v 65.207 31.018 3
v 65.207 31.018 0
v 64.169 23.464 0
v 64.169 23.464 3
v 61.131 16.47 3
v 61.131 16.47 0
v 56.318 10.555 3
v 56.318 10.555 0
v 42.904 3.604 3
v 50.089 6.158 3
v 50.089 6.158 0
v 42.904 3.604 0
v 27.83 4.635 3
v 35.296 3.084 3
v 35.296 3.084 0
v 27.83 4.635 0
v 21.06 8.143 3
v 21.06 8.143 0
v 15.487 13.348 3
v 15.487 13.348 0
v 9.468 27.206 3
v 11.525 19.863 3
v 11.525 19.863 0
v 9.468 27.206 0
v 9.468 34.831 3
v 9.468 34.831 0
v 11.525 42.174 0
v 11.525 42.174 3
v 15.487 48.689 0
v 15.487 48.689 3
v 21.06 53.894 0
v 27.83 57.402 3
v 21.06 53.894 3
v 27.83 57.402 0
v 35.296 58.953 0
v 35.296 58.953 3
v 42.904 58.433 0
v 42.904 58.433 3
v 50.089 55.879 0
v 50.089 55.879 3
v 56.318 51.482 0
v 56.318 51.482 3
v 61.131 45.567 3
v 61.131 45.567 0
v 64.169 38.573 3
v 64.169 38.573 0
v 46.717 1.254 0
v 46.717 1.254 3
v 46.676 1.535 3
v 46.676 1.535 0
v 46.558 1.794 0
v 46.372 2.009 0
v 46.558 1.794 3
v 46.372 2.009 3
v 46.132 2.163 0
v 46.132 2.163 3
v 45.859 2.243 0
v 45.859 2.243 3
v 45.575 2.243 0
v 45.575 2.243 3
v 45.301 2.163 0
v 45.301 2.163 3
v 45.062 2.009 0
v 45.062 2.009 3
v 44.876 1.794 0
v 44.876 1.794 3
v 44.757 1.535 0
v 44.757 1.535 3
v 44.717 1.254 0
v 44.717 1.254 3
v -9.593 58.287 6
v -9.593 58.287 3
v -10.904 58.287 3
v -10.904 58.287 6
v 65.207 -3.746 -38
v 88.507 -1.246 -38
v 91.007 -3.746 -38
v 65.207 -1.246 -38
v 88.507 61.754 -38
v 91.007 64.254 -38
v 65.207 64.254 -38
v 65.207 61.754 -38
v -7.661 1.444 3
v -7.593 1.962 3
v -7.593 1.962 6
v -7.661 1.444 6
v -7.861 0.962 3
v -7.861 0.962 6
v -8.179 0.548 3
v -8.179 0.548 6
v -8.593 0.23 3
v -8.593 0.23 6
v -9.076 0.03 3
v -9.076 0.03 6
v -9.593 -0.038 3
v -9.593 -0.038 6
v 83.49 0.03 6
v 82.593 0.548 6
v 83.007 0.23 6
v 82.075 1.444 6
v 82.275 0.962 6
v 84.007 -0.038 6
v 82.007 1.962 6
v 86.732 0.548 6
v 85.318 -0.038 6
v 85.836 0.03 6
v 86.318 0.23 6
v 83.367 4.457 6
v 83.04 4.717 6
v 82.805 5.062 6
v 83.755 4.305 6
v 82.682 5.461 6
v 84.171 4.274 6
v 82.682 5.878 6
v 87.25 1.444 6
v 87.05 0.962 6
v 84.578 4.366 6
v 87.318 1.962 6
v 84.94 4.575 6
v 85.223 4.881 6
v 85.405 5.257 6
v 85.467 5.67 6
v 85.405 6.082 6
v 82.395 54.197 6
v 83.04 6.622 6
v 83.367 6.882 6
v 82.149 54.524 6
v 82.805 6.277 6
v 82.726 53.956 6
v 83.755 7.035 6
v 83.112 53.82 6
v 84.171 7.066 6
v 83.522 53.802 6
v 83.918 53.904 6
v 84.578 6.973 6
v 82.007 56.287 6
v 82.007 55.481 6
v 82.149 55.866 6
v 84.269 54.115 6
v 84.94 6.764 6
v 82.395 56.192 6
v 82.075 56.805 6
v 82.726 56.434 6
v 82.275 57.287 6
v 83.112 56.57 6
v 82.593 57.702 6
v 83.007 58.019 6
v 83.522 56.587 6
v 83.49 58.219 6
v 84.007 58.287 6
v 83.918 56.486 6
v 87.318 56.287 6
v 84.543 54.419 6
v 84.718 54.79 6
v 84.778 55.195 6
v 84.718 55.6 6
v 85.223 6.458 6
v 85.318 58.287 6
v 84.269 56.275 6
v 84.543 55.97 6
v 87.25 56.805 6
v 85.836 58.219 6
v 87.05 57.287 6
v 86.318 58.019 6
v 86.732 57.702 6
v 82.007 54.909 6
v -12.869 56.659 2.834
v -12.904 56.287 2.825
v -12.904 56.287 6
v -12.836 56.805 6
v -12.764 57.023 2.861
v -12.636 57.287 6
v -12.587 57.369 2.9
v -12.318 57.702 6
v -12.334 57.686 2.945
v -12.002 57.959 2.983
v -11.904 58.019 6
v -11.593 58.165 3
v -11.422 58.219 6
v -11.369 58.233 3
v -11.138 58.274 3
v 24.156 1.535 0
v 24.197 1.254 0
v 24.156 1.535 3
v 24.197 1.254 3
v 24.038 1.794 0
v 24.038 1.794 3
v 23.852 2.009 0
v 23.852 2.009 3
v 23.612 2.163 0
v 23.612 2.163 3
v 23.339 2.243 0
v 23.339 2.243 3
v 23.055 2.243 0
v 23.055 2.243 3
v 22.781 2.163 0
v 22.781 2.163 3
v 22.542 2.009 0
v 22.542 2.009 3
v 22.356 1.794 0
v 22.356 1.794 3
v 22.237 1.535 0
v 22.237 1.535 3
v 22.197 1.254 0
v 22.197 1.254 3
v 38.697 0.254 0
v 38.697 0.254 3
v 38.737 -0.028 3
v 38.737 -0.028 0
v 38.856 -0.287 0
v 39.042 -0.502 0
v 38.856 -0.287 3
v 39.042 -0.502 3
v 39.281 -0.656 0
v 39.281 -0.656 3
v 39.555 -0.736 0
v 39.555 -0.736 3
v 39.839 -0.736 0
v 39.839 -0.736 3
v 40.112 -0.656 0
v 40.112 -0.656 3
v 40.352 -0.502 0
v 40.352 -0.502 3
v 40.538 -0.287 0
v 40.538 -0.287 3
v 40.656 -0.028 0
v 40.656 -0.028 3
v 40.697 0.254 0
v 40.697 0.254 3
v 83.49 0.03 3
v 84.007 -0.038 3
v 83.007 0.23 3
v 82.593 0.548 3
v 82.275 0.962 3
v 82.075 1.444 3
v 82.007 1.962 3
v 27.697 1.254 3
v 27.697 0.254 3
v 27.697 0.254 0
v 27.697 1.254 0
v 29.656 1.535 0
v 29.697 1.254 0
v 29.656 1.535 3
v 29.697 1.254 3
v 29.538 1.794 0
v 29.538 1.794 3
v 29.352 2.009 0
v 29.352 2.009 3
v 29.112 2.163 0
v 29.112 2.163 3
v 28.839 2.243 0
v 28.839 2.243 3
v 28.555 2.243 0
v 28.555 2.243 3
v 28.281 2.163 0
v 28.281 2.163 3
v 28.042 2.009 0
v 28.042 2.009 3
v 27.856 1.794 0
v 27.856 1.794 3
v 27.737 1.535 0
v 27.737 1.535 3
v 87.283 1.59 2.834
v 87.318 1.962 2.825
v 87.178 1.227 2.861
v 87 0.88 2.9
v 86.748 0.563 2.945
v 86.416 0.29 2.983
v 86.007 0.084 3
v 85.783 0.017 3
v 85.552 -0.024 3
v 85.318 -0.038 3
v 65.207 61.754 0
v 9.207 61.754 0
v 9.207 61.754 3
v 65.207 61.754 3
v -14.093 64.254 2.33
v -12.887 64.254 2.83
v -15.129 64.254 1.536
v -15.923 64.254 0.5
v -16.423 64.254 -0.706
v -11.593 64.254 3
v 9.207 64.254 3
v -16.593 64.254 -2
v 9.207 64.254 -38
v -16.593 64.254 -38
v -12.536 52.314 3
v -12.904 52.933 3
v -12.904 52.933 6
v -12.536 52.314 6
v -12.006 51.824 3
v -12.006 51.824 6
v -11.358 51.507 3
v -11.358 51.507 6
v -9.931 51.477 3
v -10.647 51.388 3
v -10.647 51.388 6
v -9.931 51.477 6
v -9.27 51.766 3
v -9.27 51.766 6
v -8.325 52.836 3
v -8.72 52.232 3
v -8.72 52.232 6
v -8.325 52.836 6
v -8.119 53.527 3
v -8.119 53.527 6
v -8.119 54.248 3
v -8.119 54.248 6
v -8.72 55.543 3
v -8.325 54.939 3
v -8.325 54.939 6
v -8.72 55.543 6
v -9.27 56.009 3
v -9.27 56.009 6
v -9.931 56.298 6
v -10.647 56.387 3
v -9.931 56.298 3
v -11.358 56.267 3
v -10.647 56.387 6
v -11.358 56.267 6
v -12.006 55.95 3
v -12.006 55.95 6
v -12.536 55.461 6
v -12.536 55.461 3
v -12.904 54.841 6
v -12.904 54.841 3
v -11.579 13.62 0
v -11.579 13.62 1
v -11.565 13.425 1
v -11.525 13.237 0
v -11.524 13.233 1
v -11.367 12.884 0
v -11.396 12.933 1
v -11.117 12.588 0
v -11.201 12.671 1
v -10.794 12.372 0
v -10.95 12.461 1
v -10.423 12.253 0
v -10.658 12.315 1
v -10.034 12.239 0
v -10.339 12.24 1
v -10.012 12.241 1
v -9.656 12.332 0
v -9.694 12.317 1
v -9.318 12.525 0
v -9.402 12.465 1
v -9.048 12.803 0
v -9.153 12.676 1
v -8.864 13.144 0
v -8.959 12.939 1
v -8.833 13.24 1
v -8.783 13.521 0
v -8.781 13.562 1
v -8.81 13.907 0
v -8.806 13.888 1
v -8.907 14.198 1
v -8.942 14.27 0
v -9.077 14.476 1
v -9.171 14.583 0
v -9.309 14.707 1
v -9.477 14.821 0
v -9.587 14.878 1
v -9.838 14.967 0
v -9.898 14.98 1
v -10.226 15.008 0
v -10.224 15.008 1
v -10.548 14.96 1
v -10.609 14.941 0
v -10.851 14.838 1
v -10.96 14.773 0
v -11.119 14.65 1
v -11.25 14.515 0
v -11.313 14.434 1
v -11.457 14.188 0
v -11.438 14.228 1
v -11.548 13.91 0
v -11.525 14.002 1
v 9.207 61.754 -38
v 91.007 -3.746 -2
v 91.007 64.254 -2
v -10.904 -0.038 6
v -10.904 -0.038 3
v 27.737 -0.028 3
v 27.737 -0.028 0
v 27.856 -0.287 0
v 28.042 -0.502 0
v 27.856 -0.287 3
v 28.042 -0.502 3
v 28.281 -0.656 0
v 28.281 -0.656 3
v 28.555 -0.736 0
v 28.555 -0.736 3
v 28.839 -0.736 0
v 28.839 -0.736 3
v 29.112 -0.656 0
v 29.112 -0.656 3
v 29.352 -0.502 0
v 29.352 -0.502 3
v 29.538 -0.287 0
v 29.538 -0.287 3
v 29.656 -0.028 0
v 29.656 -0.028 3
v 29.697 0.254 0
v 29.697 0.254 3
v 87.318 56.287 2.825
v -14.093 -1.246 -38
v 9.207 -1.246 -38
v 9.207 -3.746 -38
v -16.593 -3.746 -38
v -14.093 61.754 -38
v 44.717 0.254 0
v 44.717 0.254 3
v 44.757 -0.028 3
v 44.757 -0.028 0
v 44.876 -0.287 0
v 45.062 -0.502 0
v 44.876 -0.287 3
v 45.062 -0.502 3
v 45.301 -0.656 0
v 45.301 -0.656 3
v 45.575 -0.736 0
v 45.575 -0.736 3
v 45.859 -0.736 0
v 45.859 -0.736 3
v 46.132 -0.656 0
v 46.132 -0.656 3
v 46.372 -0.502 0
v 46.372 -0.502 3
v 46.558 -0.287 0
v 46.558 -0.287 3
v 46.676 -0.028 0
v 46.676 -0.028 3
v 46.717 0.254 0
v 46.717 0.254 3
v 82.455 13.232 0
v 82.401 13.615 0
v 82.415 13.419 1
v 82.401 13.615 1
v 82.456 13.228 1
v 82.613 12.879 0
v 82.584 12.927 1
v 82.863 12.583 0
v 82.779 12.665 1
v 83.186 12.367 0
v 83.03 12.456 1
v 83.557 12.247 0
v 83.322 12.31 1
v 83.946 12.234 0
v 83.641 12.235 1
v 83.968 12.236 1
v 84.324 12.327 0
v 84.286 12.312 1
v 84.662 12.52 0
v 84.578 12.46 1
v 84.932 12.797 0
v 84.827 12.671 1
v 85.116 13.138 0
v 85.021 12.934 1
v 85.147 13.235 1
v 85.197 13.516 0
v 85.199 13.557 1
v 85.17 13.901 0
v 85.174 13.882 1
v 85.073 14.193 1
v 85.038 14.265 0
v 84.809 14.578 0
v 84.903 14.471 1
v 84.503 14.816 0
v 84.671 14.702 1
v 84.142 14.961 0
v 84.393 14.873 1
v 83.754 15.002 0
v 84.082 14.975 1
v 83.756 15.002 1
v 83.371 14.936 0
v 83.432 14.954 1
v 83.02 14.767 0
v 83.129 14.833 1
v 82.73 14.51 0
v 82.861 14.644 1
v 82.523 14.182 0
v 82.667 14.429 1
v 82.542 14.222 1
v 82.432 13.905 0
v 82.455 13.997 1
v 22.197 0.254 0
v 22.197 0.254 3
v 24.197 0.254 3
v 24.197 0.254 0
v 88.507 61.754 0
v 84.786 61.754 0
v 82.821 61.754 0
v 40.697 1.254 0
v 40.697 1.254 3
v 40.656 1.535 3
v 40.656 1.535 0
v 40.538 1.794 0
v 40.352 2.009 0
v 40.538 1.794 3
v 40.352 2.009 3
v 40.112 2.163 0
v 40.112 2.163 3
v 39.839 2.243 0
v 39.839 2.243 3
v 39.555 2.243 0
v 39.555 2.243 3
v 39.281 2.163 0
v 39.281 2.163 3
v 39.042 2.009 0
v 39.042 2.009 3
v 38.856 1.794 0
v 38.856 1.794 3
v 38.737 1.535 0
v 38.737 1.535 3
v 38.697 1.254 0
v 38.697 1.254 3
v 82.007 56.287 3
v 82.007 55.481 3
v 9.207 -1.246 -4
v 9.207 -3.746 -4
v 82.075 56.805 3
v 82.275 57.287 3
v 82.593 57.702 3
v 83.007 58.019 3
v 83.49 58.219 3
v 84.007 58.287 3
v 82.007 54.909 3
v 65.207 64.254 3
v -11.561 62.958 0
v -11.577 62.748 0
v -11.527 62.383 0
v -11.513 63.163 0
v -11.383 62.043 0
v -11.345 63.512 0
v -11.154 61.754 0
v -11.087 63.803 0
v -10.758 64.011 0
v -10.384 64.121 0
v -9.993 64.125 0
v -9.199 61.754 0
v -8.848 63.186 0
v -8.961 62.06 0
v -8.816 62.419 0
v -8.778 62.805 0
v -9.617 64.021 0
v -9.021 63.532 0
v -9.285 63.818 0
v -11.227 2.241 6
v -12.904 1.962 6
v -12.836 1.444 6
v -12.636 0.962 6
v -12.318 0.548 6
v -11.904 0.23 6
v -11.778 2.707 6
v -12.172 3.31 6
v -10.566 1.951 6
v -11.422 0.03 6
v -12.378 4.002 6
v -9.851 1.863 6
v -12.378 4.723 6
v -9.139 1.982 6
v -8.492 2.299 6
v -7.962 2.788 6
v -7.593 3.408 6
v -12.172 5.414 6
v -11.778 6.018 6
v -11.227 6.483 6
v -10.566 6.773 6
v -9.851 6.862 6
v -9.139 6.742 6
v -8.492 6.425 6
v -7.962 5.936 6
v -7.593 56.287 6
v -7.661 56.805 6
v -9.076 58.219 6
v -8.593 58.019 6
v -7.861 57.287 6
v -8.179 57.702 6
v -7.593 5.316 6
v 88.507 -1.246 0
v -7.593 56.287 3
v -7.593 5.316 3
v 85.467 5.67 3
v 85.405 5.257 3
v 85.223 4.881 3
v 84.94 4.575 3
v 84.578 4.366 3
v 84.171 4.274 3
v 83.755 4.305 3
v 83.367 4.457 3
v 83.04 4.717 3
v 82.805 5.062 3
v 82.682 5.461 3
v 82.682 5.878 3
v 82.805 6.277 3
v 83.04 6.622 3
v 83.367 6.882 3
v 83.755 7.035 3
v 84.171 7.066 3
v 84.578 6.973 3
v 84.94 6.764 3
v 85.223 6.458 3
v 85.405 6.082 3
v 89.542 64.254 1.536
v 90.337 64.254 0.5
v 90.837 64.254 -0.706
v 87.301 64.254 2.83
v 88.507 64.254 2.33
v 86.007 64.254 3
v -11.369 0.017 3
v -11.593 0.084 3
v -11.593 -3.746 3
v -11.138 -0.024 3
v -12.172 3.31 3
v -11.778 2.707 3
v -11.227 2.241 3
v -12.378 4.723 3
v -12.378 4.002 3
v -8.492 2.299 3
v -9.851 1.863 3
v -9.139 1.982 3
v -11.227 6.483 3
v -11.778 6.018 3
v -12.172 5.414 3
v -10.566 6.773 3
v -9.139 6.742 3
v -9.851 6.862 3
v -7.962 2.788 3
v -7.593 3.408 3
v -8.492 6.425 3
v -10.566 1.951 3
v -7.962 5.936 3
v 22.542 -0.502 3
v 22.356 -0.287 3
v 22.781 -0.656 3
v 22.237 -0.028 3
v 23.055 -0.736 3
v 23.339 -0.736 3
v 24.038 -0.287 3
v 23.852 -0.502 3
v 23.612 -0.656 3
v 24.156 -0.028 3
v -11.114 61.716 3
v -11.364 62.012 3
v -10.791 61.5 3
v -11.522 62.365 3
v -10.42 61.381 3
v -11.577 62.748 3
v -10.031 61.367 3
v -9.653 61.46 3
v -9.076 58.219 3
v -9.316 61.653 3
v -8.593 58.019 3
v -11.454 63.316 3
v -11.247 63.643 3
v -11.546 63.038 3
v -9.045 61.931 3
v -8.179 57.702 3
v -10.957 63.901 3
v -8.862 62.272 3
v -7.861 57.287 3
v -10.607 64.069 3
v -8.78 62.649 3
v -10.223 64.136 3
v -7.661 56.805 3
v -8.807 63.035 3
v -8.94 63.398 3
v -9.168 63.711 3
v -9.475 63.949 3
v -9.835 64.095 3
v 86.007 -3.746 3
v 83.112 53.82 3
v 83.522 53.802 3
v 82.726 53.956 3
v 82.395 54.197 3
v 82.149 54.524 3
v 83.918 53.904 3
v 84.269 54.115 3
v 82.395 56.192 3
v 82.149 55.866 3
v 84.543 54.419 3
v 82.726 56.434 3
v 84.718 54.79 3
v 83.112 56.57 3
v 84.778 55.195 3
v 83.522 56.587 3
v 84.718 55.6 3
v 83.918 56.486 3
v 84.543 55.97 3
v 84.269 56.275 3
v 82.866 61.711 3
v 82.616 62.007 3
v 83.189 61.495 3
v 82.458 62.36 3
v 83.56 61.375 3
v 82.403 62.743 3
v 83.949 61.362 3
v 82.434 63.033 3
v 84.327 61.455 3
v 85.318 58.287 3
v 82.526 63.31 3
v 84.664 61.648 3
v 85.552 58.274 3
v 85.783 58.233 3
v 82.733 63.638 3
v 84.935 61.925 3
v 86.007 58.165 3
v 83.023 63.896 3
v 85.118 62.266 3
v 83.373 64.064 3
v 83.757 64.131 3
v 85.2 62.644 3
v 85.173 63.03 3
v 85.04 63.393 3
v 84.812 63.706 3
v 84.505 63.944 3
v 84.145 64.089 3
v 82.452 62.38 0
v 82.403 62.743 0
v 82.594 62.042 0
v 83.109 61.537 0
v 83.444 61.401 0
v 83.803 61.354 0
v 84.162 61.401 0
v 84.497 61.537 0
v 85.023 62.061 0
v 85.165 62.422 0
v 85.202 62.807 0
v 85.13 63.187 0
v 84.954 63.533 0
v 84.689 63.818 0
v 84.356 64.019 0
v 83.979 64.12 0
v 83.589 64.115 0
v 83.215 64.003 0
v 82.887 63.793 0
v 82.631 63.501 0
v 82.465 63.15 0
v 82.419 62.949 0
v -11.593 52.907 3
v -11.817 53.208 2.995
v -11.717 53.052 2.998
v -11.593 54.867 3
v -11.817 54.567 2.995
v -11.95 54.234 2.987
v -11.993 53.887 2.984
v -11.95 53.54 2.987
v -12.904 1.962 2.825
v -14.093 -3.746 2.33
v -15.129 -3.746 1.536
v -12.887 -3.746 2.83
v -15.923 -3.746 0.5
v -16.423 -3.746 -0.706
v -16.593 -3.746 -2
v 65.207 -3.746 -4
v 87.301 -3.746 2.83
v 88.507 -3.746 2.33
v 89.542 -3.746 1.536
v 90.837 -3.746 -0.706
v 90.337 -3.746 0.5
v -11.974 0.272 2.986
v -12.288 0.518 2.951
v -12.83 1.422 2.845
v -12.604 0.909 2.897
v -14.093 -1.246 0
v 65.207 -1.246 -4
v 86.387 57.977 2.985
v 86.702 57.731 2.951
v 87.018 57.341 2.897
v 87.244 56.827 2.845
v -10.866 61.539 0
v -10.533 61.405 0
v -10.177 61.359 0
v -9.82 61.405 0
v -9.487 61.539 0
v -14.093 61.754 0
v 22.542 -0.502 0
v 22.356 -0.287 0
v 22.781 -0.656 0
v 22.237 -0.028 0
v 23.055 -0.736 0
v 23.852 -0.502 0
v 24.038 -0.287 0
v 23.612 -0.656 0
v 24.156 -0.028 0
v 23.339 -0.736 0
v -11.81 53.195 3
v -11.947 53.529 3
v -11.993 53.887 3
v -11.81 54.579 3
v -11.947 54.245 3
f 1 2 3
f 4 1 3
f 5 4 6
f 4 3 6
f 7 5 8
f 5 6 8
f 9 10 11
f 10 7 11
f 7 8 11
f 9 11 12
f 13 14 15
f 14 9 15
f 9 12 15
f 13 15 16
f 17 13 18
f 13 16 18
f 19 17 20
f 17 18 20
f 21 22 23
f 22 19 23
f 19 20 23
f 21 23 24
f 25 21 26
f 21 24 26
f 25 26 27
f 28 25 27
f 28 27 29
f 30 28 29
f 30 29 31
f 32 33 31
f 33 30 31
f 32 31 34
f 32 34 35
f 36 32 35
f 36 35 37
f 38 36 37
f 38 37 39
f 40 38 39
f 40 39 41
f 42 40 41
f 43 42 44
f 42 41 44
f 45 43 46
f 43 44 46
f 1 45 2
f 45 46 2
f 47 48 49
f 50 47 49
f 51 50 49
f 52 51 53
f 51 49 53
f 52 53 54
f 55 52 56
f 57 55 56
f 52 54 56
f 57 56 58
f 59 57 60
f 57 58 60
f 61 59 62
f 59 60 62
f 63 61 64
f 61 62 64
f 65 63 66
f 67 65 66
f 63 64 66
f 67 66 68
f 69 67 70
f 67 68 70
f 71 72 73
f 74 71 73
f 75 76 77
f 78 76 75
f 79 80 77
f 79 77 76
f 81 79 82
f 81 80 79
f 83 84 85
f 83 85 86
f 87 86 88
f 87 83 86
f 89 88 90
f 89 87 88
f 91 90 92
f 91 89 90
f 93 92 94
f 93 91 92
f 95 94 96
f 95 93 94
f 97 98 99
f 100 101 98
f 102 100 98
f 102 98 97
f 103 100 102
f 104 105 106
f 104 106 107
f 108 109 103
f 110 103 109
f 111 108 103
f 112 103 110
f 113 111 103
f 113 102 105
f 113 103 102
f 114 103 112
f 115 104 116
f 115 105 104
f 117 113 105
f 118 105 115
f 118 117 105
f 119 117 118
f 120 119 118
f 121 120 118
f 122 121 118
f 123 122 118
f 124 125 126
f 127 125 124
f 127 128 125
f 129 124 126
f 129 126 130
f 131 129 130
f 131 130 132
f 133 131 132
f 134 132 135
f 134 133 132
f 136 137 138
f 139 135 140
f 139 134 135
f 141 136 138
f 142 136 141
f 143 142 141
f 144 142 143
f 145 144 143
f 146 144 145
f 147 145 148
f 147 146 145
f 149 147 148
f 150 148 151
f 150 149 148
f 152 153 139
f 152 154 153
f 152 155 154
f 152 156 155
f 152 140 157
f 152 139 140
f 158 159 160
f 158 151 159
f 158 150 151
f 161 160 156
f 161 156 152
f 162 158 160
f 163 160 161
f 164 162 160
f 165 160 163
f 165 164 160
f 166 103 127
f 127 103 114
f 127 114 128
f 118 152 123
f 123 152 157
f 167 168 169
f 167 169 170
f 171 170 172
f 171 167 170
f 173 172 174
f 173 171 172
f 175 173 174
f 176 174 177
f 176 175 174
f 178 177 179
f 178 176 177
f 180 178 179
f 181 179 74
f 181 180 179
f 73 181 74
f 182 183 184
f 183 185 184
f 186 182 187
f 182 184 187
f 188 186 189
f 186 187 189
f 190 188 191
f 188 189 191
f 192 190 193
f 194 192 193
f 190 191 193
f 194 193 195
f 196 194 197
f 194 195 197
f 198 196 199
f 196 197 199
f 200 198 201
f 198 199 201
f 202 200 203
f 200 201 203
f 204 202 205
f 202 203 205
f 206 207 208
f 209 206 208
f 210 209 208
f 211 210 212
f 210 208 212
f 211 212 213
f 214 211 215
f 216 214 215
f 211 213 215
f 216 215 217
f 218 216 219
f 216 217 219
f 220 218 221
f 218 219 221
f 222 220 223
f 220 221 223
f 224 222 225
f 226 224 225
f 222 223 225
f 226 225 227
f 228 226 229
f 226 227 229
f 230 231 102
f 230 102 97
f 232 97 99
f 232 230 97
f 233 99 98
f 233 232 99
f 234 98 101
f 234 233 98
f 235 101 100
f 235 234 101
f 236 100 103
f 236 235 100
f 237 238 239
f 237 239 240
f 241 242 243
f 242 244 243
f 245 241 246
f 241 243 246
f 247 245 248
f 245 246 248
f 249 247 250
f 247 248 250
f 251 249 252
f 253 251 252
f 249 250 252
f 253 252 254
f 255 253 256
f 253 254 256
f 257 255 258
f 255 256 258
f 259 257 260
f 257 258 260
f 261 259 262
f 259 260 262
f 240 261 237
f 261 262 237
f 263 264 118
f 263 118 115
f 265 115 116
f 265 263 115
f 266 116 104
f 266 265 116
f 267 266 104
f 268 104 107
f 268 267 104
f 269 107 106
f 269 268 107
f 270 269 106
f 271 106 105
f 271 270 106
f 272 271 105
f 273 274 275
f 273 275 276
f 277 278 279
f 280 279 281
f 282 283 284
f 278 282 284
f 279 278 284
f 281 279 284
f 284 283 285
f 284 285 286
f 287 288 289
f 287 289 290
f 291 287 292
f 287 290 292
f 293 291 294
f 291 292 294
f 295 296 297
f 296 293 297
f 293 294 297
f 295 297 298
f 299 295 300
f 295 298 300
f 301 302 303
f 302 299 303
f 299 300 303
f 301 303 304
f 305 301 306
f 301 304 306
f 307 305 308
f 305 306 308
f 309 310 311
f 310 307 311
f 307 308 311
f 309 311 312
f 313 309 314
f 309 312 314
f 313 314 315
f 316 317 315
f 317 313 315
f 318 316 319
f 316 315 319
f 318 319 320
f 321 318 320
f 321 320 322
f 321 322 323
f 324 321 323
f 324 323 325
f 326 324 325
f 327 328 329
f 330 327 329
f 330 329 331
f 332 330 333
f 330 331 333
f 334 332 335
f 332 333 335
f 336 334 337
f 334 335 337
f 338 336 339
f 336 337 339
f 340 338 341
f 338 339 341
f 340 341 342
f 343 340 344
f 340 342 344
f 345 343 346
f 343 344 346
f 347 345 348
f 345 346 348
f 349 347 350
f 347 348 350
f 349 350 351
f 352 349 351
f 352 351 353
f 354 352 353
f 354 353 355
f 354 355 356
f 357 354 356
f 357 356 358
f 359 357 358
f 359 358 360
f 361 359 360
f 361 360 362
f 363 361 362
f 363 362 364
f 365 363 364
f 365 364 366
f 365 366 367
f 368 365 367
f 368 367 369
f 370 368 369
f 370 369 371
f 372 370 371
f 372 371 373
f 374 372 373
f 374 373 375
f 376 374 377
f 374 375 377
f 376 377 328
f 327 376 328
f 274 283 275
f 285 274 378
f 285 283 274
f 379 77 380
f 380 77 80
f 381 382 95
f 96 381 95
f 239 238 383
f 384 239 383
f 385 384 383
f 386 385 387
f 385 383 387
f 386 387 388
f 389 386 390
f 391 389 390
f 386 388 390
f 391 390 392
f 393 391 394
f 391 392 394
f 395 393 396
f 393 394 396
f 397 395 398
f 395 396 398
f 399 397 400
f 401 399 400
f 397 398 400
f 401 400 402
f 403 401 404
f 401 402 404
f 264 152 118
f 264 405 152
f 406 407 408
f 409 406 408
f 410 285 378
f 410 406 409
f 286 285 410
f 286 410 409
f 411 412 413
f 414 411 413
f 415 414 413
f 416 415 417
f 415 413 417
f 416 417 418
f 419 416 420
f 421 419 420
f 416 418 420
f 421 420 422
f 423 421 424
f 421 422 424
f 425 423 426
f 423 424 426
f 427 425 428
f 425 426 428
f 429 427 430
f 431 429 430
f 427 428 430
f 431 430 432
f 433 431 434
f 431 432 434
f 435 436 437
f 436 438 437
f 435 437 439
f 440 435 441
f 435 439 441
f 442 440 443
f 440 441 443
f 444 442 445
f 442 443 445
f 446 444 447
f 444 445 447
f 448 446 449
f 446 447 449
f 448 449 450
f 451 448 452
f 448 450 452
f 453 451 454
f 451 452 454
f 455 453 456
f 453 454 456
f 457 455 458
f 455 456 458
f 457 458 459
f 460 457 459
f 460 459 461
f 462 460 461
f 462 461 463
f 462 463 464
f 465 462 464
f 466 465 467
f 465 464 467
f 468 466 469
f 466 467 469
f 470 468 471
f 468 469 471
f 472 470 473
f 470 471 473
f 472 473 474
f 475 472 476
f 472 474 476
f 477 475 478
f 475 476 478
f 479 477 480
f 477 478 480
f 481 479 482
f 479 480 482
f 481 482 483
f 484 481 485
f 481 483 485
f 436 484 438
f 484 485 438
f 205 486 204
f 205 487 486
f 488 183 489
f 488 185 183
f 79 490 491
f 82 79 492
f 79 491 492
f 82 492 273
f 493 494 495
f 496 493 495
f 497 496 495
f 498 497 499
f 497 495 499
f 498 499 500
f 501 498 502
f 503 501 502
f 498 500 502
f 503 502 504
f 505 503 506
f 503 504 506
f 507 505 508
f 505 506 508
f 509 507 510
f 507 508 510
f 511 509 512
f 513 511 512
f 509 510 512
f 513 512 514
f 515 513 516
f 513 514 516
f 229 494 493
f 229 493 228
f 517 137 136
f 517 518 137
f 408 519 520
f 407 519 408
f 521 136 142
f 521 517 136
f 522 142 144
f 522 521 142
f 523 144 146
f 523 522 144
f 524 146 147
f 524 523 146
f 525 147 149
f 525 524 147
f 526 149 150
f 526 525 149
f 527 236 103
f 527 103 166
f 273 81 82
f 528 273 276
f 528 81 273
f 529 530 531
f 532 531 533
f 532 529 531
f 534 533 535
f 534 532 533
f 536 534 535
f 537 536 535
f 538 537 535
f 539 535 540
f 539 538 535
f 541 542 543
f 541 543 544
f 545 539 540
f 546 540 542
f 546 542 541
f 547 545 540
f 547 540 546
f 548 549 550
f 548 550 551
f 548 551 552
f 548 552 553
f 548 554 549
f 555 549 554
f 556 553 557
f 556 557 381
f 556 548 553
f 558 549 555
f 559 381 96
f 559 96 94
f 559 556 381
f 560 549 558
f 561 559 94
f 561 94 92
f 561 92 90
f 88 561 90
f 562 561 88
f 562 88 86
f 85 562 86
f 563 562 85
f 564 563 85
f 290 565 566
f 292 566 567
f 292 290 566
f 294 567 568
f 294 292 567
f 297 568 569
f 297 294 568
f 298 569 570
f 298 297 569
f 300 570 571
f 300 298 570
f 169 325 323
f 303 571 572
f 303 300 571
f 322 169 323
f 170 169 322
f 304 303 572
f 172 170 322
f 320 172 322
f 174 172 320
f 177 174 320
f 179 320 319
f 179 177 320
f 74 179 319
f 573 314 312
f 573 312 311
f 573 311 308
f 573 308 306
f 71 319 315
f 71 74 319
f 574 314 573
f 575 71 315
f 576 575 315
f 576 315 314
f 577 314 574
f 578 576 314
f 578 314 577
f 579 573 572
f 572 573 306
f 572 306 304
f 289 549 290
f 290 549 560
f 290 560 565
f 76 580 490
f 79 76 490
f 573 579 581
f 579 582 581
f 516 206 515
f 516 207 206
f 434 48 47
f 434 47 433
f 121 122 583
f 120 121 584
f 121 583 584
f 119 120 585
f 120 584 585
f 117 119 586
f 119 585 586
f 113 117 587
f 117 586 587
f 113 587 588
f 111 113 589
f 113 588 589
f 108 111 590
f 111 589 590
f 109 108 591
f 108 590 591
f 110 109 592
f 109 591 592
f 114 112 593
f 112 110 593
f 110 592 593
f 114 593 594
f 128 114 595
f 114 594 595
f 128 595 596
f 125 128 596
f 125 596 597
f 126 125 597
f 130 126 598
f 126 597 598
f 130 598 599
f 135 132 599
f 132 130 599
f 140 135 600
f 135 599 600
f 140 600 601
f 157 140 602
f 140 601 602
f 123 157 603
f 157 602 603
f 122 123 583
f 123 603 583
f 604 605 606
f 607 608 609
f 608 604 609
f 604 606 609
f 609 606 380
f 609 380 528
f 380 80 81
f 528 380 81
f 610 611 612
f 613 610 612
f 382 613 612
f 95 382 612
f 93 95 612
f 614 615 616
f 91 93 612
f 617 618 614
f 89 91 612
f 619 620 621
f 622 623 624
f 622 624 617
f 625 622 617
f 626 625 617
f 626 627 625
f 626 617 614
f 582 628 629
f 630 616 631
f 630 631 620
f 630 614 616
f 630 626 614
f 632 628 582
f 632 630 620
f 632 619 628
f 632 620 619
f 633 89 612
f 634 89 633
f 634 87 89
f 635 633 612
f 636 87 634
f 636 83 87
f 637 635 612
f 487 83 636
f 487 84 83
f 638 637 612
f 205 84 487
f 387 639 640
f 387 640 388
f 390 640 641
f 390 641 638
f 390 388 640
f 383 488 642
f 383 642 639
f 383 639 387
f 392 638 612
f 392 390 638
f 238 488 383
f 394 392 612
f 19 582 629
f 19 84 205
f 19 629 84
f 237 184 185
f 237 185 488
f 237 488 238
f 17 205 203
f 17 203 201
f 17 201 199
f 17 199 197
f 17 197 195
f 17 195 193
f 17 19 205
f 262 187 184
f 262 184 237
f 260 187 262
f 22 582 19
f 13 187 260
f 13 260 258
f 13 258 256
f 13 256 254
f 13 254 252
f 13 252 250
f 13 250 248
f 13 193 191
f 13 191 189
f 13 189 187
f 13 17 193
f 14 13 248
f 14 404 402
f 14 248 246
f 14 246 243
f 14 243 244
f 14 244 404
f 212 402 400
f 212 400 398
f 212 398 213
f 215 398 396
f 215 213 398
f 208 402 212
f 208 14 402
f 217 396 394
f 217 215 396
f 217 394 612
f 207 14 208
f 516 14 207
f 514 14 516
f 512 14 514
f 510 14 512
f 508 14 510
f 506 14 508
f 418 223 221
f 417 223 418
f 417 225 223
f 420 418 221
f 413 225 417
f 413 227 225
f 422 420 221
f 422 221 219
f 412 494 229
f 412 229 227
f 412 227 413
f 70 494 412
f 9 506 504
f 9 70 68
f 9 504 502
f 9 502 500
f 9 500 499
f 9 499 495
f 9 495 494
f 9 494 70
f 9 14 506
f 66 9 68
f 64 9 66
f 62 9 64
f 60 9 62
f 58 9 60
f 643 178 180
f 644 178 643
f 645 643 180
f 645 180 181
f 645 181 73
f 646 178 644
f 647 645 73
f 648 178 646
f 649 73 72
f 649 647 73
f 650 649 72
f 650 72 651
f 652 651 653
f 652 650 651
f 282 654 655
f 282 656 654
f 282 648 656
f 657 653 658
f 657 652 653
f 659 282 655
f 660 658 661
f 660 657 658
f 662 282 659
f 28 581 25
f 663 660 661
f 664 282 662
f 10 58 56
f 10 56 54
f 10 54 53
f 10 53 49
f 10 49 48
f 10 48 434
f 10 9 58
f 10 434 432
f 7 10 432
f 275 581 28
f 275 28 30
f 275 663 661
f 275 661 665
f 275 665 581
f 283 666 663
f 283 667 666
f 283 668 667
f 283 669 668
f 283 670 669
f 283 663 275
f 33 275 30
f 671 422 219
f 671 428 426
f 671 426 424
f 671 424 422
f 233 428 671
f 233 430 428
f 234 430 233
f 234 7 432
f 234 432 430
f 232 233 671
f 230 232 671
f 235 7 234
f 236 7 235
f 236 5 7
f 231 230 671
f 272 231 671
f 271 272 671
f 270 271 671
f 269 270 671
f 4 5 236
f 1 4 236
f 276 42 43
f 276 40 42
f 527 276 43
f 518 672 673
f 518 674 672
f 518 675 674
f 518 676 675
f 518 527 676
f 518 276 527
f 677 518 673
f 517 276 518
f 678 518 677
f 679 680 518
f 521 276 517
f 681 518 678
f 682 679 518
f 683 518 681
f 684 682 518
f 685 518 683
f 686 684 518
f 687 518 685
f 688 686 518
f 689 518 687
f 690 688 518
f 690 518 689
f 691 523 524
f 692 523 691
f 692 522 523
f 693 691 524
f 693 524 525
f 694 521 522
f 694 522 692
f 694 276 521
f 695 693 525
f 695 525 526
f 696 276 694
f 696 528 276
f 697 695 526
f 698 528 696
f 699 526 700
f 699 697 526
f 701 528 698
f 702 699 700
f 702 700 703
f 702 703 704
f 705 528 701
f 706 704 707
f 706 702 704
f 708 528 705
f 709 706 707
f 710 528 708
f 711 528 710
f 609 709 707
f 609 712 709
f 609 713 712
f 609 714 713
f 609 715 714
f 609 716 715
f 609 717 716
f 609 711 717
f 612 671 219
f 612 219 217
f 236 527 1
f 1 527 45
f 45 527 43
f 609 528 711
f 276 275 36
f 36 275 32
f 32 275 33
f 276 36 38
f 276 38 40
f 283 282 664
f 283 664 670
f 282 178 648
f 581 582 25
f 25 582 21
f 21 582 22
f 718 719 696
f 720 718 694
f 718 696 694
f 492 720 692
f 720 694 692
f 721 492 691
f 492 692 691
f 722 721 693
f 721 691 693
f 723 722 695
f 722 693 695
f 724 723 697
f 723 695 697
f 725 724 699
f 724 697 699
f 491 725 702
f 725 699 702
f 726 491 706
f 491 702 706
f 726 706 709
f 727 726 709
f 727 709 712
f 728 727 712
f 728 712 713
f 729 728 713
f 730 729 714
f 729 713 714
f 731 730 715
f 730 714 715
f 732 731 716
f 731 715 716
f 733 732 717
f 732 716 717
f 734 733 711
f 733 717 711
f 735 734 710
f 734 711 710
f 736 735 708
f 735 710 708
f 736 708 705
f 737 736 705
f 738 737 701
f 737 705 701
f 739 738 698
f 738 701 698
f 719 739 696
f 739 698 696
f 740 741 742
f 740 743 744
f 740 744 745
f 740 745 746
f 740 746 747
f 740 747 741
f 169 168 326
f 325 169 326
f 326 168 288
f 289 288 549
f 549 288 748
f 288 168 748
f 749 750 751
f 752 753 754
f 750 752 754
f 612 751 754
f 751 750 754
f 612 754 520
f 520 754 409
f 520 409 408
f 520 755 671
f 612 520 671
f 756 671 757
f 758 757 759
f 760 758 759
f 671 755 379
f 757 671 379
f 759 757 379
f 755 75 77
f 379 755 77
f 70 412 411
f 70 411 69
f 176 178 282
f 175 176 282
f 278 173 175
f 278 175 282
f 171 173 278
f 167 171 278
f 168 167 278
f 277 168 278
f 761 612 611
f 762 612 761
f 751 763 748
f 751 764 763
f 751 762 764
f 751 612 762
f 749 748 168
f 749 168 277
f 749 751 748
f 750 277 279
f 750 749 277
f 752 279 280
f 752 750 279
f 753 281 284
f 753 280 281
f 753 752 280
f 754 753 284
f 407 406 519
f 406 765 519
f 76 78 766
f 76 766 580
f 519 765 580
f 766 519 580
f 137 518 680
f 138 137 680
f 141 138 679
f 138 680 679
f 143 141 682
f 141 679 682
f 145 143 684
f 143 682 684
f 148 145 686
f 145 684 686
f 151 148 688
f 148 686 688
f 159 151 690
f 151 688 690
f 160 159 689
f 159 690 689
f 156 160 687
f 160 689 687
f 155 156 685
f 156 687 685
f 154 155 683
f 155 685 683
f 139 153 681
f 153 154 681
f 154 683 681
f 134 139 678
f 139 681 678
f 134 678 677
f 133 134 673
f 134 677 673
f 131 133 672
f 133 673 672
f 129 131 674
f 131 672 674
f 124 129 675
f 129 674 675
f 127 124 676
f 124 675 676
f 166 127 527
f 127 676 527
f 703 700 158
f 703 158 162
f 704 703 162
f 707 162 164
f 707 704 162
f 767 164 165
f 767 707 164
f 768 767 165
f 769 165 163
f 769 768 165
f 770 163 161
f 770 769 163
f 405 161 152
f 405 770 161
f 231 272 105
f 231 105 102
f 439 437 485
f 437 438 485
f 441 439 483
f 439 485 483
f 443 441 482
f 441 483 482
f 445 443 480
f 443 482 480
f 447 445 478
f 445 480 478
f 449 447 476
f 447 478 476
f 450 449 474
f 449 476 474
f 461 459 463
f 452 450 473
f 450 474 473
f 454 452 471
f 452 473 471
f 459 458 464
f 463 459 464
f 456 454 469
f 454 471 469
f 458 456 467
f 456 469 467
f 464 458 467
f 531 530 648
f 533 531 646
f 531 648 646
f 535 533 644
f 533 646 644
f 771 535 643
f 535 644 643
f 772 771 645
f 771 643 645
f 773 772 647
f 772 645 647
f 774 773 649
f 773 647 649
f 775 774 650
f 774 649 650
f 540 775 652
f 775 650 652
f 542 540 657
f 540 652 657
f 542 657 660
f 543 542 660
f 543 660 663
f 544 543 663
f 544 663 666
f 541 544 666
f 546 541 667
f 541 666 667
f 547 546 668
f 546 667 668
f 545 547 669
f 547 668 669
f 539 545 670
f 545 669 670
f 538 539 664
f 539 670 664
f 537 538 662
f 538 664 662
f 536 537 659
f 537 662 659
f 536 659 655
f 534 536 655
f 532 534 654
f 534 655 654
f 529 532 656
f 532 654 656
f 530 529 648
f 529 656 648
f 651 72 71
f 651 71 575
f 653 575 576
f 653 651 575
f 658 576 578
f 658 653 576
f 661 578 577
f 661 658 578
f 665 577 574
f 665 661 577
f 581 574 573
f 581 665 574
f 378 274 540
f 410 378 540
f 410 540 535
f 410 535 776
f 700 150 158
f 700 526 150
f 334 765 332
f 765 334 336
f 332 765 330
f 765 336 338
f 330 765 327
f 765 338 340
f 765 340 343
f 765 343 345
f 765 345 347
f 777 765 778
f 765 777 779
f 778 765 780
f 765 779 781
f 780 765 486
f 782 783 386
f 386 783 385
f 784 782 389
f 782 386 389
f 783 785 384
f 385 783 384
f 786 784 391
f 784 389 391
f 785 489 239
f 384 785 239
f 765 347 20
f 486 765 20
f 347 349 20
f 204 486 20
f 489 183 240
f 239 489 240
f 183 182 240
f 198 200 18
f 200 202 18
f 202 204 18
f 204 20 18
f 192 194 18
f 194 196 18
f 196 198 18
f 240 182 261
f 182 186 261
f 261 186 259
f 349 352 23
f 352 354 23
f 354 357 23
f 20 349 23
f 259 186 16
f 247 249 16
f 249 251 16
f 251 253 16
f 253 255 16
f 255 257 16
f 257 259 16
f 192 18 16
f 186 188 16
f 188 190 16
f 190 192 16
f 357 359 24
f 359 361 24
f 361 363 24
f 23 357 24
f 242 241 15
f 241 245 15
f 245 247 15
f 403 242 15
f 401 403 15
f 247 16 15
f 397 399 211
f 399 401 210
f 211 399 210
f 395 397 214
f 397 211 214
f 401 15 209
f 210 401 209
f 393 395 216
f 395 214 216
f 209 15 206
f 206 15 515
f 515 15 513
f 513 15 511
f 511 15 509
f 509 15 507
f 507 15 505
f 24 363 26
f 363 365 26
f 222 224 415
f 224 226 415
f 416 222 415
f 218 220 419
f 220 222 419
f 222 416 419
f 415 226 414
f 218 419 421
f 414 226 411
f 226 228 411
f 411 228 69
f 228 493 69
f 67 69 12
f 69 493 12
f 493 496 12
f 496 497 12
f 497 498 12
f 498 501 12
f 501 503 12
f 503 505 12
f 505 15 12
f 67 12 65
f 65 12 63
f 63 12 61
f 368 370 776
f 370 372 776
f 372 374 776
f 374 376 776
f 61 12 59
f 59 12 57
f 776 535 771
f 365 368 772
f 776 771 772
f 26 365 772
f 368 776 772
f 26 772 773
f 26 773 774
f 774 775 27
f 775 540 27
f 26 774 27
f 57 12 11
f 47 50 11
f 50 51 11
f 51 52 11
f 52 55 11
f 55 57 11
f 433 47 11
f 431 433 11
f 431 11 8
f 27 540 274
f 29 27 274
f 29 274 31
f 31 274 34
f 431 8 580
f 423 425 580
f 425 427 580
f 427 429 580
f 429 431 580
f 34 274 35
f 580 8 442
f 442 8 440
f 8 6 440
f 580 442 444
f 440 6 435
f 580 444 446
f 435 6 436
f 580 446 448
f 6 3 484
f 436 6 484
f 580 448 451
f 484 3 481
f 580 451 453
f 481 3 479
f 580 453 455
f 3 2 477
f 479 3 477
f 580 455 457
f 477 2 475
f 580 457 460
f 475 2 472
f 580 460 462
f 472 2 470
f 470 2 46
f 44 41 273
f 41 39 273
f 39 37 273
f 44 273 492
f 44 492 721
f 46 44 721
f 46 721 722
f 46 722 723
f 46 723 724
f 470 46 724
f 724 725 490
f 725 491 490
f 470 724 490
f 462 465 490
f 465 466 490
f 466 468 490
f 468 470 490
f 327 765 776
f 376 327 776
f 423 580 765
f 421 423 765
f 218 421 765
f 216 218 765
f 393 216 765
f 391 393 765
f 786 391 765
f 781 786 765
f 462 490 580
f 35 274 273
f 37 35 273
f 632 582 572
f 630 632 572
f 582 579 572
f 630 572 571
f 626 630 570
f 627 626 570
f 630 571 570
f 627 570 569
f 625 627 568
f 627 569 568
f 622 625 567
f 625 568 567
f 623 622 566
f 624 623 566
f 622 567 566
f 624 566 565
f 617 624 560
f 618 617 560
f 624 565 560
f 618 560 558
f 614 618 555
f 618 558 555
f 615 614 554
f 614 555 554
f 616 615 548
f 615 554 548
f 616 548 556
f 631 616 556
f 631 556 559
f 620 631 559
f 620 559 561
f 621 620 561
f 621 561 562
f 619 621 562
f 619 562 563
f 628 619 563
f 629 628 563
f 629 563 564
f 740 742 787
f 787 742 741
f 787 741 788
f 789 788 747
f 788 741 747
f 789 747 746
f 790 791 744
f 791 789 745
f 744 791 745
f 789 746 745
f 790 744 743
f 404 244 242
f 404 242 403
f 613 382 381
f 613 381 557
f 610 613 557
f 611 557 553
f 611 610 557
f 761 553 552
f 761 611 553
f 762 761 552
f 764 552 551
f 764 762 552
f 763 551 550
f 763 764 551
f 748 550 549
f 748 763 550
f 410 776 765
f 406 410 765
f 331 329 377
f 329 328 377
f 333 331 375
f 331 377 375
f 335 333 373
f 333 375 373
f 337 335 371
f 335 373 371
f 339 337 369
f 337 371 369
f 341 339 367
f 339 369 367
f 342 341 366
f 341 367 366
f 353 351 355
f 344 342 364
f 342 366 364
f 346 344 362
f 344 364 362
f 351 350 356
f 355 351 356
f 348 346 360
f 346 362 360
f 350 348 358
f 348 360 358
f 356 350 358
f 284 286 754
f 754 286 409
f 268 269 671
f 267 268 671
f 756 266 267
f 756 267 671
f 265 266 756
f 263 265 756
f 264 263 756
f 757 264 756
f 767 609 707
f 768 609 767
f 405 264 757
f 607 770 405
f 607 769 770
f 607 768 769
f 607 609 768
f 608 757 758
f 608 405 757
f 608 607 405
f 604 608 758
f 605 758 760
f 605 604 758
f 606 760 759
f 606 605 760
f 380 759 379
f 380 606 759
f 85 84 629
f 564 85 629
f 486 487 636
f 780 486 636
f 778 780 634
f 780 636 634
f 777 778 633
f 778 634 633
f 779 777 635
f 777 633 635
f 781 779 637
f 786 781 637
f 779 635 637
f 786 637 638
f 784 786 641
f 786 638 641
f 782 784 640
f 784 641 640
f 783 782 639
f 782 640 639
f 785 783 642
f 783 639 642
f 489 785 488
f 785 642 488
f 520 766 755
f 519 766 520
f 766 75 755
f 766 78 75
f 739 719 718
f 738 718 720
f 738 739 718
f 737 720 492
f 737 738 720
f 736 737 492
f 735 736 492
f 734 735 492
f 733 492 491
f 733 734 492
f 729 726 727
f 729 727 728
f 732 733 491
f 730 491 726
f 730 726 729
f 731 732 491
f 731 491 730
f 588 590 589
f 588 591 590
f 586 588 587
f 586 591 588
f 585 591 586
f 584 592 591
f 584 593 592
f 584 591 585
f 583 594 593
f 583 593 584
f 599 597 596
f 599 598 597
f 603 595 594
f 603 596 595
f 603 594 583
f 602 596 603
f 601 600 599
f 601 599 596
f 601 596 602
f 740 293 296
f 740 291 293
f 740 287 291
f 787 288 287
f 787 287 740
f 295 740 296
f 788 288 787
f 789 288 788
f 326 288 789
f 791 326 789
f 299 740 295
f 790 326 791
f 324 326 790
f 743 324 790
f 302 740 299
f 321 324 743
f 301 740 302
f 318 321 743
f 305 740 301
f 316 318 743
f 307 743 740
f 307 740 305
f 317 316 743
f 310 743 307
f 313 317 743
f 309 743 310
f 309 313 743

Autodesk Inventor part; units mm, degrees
ref_plane "YZ Plane" through (0, 0, 0) normal (1, 0, 0) x (0, 1, 0)
ref_plane "XZ Plane" through (0, 0, 0) normal (0, 1, 0) x (-1, 0, 0)
ref_plane "XY Plane" through (0, 0, 0) normal (0, 0, 1) x (1, 0, 0)
sketch "Sketch1" plane through (0, 0, 0) normal (0, 0, 1) x (1, 0, 0)
  circle A0 centre (37.2069, 31.0185) radius 28
  line L0 (-13.5931, 3.1035) -> (88.0069, 3.1035) construction
  line L1 (14.2069, 60.2535) -> (-13.5931, 60.2535) construction
  line L2 (88.0069, 60.2535) -> (60.0869, 60.2535) construction
  line L3 (88.0069, 3.1035) -> (88.0069, 60.2535) construction
  line L4 (-13.5931, 60.2535) -> (-13.5931, 3.1035) construction
  line L5 (11.269, 60.2207) -> (67.149, 60.2207) construction
  line L6 (67.149, 60.2207) -> (67.149, 72.2207) construction
  line L7 (67.149, 72.2207) -> (11.269, 72.2207) construction
  line L8 (11.269, 72.2207) -> (11.269, 60.2207) construction
  circle A1 centre (61.389, 6.2635) radius 1.5 construction
  circle A2 centre (61.389, 55.7935) radius 1.5 construction
  circle A3 centre (5.509, 55.7935) radius 1.5 construction
  circle A4 centre (11.269, 6.9135) radius 1.5 construction
  arc A5 (11.269, 7.6907) -> (11.269, 1.6907) centre (11.269, 4.6907) ccw construction
  line L9 (11.269, 1.6907) -> (11.269, -3.7465) construction
  line L10 (11.269, -3.7465) -> (67.149, -3.7465) construction
  line L11 (67.149, -3.7465) -> (67.149, 1.6907) construction
  arc A6 (67.149, 1.6907) -> (67.149, 7.6907) centre (67.149, 4.6907) ccw construction
  line L12 (67.149, 7.6907) -> (67.149, 51.2207) construction
  arc A7 (67.149, 51.2207) -> (67.149, 57.2207) centre (67.149, 54.2207) ccw construction
  line L13 (67.149, 57.2207) -> (67.149, 60.2207) construction
  line L14 (67.149, 60.2207) -> (11.269, 60.2207) construction
  line L15 (11.269, 60.2207) -> (11.269, 57.2207) construction
  arc A8 (11.269, 57.2207) -> (11.269, 51.2207) centre (11.269, 54.2207) ccw construction
  line L16 (11.269, 51.2207) -> (11.269, 7.6907) construction
  line L17 (-16.5931, -3.7465) -> (91.0069, -3.7465)
  line L18 (91.0069, -3.7465) -> (91.0069, 64.2535)
  line L19 (91.0069, 64.2535) -> (-16.5931, 64.2535)
  line L20 (-16.5931, 64.2535) -> (-16.5931, -3.7465)
  line L21 (37.2069, -3.7465) -> (37.2069, 64.2535) construction
  circle A9 centre (37.2069, 31.0185) radius 23 projected
  point P0 (0, 0)
  dimension "d42" = 0
  dimension "d43" = 3
  dimension "d44" = 3
  dimension "d45" = 4
  dimension "d46" = 4
  dimension "d47" = 57.15
  dimension "d48" = 57.15
  dimension "d49" = 101.6
  dimension "d50" = 3.81
  dimension "d56" = 68
  dimension "d59" = 56
extrude "Extrusion1" add sketch "Sketch1" along normal blind 3 contours L20 L19 L18 L17
sketch "Sketch2" plane through (0, 0, 0) normal (0, 0, -1) x (-1, 0, 0)
  circle A0 centre (-37.2069, 31.0185) radius 28 projected
  line L0 (16.5931, -3.7465) -> (-91.0069, -3.7465) projected
  line L1 (16.5931, 64.2535) -> (16.5931, -3.7465) projected
  line L2 (-91.0069, 64.2535) -> (16.5931, 64.2535) projected
  line L3 (-91.0069, -3.7465) -> (-91.0069, 64.2535) projected
  line L4 (-88.5069, 61.7535) -> (14.0931, 61.7535)
  line L5 (14.0931, 61.7535) -> (14.0931, -1.2465)
  line L6 (14.0931, -1.2465) -> (-88.5069, -1.2465)
  line L7 (-88.5069, -1.2465) -> (-88.5069, 61.7535)
  dimension "d51" = 2.5
  dimension "d52" = 2.5
  dimension "d53" = 2.5
  dimension "d54" = 2.5
extrude "Extrusion2" add sketch "Sketch2" along normal blind 38 contours L0 L3 L2 L1
sketch "Sketch4" plane through (0, 0, 3) normal (0, 0, 1) x (1, 0, 0)
  ellipse E0 centre (83.8034, 62.7427) end of major axis (82.4034, 62.7427) minor radius 1.3886 projected
  ellipse E1 centre (83.8006, 13.6146) end of major axis (82.4006, 13.6146) minor radius 1.3886 projected
  ellipse E2 centre (-10.1794, 13.6199) end of major axis (-11.5794, 13.6199) minor radius 1.3886 projected
  ellipse E3 centre (-10.1766, 62.7479) end of major axis (-11.5766, 62.7479) minor radius 1.3886 projected
  point P0 (0, 0)
extrude "Extrusion3" cut sketch "Sketch4" against normal blind 3
chamfer "Chamfer1" [suppressed]
sketch "Sketch5" plane through (-16.5931, 64.2535, 3) normal (0, 1, 0) x (1, 0, 0)
  line L0 (0, 0) -> (107.6, 0)
  line L1 (25.8, 63) -> (81.8, 63)
  line L2 (81.8, 63) -> (81.8, 7)
  line L3 (81.8, 7) -> (25.8, 7)
  line L4 (25.8, 7) -> (25.8, 63)
  line L5 (53.8, 0) -> (53.8, -31.7336) construction
  line L6 (25.8, 63) -> (81.8, 7) construction
  line L7 (81.8, 63) -> (25.8, 7) construction
  line L8 (104.9242, 0) -> (-0.6758, 0)
  line L9 (107.6, 0) -> (0, 0) projected
  line L10 (0, 41) -> (107.6, 41) projected
  line L11 (53.8, 41) -> (53.8, 0) construction
  point P0 (19.351, -30)
  point P1 (53.8, 35)
  point P2 (53.8, 35)
  dimension "d28" = 56
  dimension "d29" = 56
  dimension "d41" = 7
extrude "Extrusion4" cut sketch "Sketch5" against normal blind 100
fillet "Fillet2" radius 5 2 edges at (-16.5931, 30.2535, 3) (91.0069, 30.2535, 3)
fillet "Fillet3" [suppressed]
sketch "Sketch6" plane through (9.2069, 64.2535, -4) normal (0, 1, 0) x (1, 0, 0)
  line L0 (81.8, -7) -> (-25.8, -7) projected
  line L1 (0, 0) -> (56, 0)
  line L2 (56, 0) -> (56, -7)
  line L3 (56, -7) -> (0, -7)
  line L4 (0, -7) -> (0, 0)
  point P0 (76.8, -7)
  point P1 (-20.8, -7)
  point P2 (-9.2069, -4)
extrude "Extrusion5" cut sketch "Sketch6" against normal blind 2.5
sketch "Sketch7" plane through (0, 0, 3) normal (0, 0, 1) x (1, 0, 0)
  line L0 (-16.5931, -3.7465) -> (91.0069, -3.7465) projected
  line L1 (65.2069, 61.7535) -> (9.2069, 61.7535) projected
  line L2 (37.2069, -3.7465) -> (37.2069, 61.7535) construction
  line L3 (23.1969, -0.7465) -> (23.1969, -0.7465)
  line L4 (22.1969, 0.2535) -> (22.1969, 1.2535)
  line L5 (23.1969, 2.2535) -> (23.1969, 2.2535)
  line L6 (24.1969, 1.2535) -> (24.1969, 0.2535)
  arc A0 (24.1969, 1.2535) -> (23.1969, 2.2535) centre (23.1969, 1.2535) ccw
  arc A1 (23.1969, 2.2535) -> (22.1969, 1.2535) centre (23.1969, 1.2535) ccw
  arc A2 (22.1969, 0.2535) -> (23.1969, -0.7465) centre (23.1969, 0.2535) ccw
  arc A3 (23.1969, -0.7465) -> (24.1969, 0.2535) centre (23.1969, 0.2535) ccw
  line L7 (27.6969, 0.2535) -> (27.6969, 1.2535)
  line L8 (29.6969, 1.2535) -> (29.6969, 0.2535)
  arc A4 (29.6969, 1.2535) -> (28.6969, 2.2535) centre (28.6969, 1.2535) ccw
  arc A5 (28.6969, 2.2535) -> (27.6969, 1.2535) centre (28.6969, 1.2535) ccw
  arc A6 (27.6969, 0.2535) -> (28.6969, -0.7465) centre (28.6969, 0.2535) ccw
  arc A7 (28.6969, -0.7465) -> (29.6969, 0.2535) centre (28.6969, 0.2535) ccw
  line L9 (44.7169, 0.2535) -> (44.7169, 1.2535)
  line L10 (46.7169, 1.2535) -> (46.7169, 0.2535)
  arc A8 (46.7169, 1.2535) -> (45.7169, 2.2535) centre (45.7169, 1.2535) ccw
  arc A9 (45.7169, 2.2535) -> (44.7169, 1.2535) centre (45.7169, 1.2535) ccw
  arc A10 (44.7169, 0.2535) -> (45.7169, -0.7465) centre (45.7169, 0.2535) ccw
  arc A11 (45.7169, -0.7465) -> (46.7169, 0.2535) centre (45.7169, 0.2535) ccw
  line L11 (38.6969, 0.2535) -> (38.6969, 1.2535)
  line L12 (40.6969, 1.2535) -> (40.6969, 0.2535)
  arc A12 (40.6969, 1.2535) -> (39.6969, 2.2535) centre (39.6969, 1.2535) ccw
  arc A13 (39.6969, 2.2535) -> (38.6969, 1.2535) centre (39.6969, 1.2535) ccw
  arc A14 (38.6969, 0.2535) -> (39.6969, -0.7465) centre (39.6969, 0.2535) ccw
  arc A15 (39.6969, -0.7465) -> (40.6969, 0.2535) centre (39.6969, 0.2535) ccw
  line L13 (29.6969, 0.7535) -> (44.7169, 0.7535) construction
  point P0 (-11.5931, -3.7465)
  point P1 (86.0069, -3.7465)
  point P2 (0, 0)
  point P3 (24.1969, -0.7465)
  point P4 (22.1969, 2.2535)
  point P5 (24.1969, 2.2535)
  point P6 (29.6969, -0.7465)
  point P7 (27.6969, 2.2535)
  point P8 (29.6969, 2.2535)
  point P9 (46.7169, -0.7465)
  point P10 (44.7169, 2.2535)
  point P11 (46.7169, 2.2535)
  point P12 (40.6969, -0.7465)
  point P13 (38.6969, 2.2535)
  point P14 (40.6969, 2.2535)
  point P15 (37.2069, 0.7535)
  dimension "d64" = 2
  dimension "d66" = 3
  dimension "d67" = 1
  dimension "d68" = 1
  dimension "d69" = 4
  dimension "d78" = 16.5
  dimension "d79" = 13.01
  dimension "d80" = 1.49
extrude "Extrusion6" cut sketch "Sketch7" against normal blind 3
sketch "Sketch10" plane through (0, 0, 3) normal (0, 0, 1) x (1, 0, 0)
  circle A0 centre (37.2069, 31.0185) radius 28 projected
  circle A1 centre (83.3776, 55.1949) radius 1.4 projected
  circle A2 centre (-9.9042, 4.3621) radius 1.4 projected
  circle A3 centre (-10.5933, 53.8873) radius 1.4 projected
  circle A4 centre (84.0667, 5.6697) radius 1.4 projected
  line L0 (-9.5933, 58.2873) -> (-10.9042, 58.2873)
  line L1 (-12.9042, 56.2873) -> (-12.9042, 1.9621)
  line L2 (-10.9042, -0.0379) -> (-9.5933, -0.0379)
  line L3 (-7.5933, 1.9621) -> (-7.5933, 56.2873)
  arc A5 (-7.5933, 56.2873) -> (-9.5933, 58.2873) centre (-9.5933, 56.2873) ccw
  arc A6 (-10.9042, 58.2873) -> (-12.9042, 56.2873) centre (-10.9042, 56.2873) ccw
  arc A7 (-9.5933, -0.0379) -> (-7.5933, 1.9621) centre (-9.5933, 1.9621) ccw
  arc A8 (-12.9042, 1.9621) -> (-10.9042, -0.0379) centre (-10.9042, 1.9621) ccw
  line L4 (37.2069, 31.0185) -> (37.2069, 47.569) construction
  line L5 (84.0072, 58.2873) -> (85.3181, 58.2873)
  line L6 (87.3181, 56.2873) -> (87.3181, 1.9621)
  line L7 (85.3181, -0.0379) -> (84.0072, -0.0379)
  line L8 (82.0072, 1.9621) -> (82.0072, 56.2873)
  arc A9 (84.0072, 58.2873) -> (82.0072, 56.2873) centre (84.0072, 56.2873) ccw
  arc A10 (87.3181, 56.2873) -> (85.3181, 58.2873) centre (85.3181, 56.2873) ccw
  arc A11 (82.0072, 1.9621) -> (84.0072, -0.0379) centre (84.0072, 1.9621) ccw
  arc A12 (85.3181, -0.0379) -> (87.3181, 1.9621) centre (85.3181, 1.9621) ccw
  point P0 (0, 0)
  dimension "d101" = 3
  dimension "d103" = 3
  dimension "d104" = 3
  dimension "d105" = 3
  dimension "d106" = 2
  dimension "d107" = 2
extrude "Extrusion9" add sketch "Sketch10" along normal blind 3 and the other way blind 2 contours A1 L8 A9 L5 A10 L6 A12 L7 A11 | A5 L3 A7 L2 A8 L1 A6 L0
sketch "Sketch11" plane through (0, 0, 6) normal (0, 0, 1) x (1, 0, 0)
  circle A0 centre (-10.5933, 53.8873) radius 1.4 projected
  circle A1 centre (-9.9042, 4.3621) radius 1.4 projected
  line L0 (82.0072, 54.9087) -> (82.0072, 1.9621) projected
  arc A2 (82.0072, 1.9621) -> (84.0072, -0.0379) centre (84.0072, 1.9621) ccw projected
  line L1 (84.0072, -0.0379) -> (85.3181, -0.0379) projected
  arc A3 (85.3181, -0.0379) -> (87.3181, 1.9621) centre (85.3181, 1.9621) ccw projected
  line L2 (87.3181, 1.9621) -> (87.3181, 56.2873) projected
  arc A4 (87.3181, 56.2873) -> (85.3181, 58.2873) centre (85.3181, 56.2873) ccw projected
  line L3 (85.3181, 58.2873) -> (84.0072, 58.2873) projected
  arc A5 (84.0072, 58.2873) -> (82.0072, 56.2873) centre (84.0072, 56.2873) ccw projected
  circle A6 centre (-10.5933, 53.8873) radius 2.5
  circle A7 centre (-9.9042, 4.3621) radius 2.5
  circle A8 centre (78.5569, 55.7835) radius 2.5
  circle A9 centre (78.5569, 6.2535) radius 2.5
  arc A10 (82.0072, 54.9087) -> (82.0072, 55.4811) centre (83.3776, 55.1949) ccw projected
  line L4 (82.0072, 56.2873) -> (82.0072, 55.4811) projected
  point P0 (0, 0)
  dimension "d112" = 5
  dimension "d114" = 5
  dimension "d115" = 5
  dimension "d116" = 5
extrude "Extrusion10" cut sketch "Sketch11" against normal blind 3 contours A0 | A1 | A6 | A7 | A8 | A9
properties part number "Enclosure01"
